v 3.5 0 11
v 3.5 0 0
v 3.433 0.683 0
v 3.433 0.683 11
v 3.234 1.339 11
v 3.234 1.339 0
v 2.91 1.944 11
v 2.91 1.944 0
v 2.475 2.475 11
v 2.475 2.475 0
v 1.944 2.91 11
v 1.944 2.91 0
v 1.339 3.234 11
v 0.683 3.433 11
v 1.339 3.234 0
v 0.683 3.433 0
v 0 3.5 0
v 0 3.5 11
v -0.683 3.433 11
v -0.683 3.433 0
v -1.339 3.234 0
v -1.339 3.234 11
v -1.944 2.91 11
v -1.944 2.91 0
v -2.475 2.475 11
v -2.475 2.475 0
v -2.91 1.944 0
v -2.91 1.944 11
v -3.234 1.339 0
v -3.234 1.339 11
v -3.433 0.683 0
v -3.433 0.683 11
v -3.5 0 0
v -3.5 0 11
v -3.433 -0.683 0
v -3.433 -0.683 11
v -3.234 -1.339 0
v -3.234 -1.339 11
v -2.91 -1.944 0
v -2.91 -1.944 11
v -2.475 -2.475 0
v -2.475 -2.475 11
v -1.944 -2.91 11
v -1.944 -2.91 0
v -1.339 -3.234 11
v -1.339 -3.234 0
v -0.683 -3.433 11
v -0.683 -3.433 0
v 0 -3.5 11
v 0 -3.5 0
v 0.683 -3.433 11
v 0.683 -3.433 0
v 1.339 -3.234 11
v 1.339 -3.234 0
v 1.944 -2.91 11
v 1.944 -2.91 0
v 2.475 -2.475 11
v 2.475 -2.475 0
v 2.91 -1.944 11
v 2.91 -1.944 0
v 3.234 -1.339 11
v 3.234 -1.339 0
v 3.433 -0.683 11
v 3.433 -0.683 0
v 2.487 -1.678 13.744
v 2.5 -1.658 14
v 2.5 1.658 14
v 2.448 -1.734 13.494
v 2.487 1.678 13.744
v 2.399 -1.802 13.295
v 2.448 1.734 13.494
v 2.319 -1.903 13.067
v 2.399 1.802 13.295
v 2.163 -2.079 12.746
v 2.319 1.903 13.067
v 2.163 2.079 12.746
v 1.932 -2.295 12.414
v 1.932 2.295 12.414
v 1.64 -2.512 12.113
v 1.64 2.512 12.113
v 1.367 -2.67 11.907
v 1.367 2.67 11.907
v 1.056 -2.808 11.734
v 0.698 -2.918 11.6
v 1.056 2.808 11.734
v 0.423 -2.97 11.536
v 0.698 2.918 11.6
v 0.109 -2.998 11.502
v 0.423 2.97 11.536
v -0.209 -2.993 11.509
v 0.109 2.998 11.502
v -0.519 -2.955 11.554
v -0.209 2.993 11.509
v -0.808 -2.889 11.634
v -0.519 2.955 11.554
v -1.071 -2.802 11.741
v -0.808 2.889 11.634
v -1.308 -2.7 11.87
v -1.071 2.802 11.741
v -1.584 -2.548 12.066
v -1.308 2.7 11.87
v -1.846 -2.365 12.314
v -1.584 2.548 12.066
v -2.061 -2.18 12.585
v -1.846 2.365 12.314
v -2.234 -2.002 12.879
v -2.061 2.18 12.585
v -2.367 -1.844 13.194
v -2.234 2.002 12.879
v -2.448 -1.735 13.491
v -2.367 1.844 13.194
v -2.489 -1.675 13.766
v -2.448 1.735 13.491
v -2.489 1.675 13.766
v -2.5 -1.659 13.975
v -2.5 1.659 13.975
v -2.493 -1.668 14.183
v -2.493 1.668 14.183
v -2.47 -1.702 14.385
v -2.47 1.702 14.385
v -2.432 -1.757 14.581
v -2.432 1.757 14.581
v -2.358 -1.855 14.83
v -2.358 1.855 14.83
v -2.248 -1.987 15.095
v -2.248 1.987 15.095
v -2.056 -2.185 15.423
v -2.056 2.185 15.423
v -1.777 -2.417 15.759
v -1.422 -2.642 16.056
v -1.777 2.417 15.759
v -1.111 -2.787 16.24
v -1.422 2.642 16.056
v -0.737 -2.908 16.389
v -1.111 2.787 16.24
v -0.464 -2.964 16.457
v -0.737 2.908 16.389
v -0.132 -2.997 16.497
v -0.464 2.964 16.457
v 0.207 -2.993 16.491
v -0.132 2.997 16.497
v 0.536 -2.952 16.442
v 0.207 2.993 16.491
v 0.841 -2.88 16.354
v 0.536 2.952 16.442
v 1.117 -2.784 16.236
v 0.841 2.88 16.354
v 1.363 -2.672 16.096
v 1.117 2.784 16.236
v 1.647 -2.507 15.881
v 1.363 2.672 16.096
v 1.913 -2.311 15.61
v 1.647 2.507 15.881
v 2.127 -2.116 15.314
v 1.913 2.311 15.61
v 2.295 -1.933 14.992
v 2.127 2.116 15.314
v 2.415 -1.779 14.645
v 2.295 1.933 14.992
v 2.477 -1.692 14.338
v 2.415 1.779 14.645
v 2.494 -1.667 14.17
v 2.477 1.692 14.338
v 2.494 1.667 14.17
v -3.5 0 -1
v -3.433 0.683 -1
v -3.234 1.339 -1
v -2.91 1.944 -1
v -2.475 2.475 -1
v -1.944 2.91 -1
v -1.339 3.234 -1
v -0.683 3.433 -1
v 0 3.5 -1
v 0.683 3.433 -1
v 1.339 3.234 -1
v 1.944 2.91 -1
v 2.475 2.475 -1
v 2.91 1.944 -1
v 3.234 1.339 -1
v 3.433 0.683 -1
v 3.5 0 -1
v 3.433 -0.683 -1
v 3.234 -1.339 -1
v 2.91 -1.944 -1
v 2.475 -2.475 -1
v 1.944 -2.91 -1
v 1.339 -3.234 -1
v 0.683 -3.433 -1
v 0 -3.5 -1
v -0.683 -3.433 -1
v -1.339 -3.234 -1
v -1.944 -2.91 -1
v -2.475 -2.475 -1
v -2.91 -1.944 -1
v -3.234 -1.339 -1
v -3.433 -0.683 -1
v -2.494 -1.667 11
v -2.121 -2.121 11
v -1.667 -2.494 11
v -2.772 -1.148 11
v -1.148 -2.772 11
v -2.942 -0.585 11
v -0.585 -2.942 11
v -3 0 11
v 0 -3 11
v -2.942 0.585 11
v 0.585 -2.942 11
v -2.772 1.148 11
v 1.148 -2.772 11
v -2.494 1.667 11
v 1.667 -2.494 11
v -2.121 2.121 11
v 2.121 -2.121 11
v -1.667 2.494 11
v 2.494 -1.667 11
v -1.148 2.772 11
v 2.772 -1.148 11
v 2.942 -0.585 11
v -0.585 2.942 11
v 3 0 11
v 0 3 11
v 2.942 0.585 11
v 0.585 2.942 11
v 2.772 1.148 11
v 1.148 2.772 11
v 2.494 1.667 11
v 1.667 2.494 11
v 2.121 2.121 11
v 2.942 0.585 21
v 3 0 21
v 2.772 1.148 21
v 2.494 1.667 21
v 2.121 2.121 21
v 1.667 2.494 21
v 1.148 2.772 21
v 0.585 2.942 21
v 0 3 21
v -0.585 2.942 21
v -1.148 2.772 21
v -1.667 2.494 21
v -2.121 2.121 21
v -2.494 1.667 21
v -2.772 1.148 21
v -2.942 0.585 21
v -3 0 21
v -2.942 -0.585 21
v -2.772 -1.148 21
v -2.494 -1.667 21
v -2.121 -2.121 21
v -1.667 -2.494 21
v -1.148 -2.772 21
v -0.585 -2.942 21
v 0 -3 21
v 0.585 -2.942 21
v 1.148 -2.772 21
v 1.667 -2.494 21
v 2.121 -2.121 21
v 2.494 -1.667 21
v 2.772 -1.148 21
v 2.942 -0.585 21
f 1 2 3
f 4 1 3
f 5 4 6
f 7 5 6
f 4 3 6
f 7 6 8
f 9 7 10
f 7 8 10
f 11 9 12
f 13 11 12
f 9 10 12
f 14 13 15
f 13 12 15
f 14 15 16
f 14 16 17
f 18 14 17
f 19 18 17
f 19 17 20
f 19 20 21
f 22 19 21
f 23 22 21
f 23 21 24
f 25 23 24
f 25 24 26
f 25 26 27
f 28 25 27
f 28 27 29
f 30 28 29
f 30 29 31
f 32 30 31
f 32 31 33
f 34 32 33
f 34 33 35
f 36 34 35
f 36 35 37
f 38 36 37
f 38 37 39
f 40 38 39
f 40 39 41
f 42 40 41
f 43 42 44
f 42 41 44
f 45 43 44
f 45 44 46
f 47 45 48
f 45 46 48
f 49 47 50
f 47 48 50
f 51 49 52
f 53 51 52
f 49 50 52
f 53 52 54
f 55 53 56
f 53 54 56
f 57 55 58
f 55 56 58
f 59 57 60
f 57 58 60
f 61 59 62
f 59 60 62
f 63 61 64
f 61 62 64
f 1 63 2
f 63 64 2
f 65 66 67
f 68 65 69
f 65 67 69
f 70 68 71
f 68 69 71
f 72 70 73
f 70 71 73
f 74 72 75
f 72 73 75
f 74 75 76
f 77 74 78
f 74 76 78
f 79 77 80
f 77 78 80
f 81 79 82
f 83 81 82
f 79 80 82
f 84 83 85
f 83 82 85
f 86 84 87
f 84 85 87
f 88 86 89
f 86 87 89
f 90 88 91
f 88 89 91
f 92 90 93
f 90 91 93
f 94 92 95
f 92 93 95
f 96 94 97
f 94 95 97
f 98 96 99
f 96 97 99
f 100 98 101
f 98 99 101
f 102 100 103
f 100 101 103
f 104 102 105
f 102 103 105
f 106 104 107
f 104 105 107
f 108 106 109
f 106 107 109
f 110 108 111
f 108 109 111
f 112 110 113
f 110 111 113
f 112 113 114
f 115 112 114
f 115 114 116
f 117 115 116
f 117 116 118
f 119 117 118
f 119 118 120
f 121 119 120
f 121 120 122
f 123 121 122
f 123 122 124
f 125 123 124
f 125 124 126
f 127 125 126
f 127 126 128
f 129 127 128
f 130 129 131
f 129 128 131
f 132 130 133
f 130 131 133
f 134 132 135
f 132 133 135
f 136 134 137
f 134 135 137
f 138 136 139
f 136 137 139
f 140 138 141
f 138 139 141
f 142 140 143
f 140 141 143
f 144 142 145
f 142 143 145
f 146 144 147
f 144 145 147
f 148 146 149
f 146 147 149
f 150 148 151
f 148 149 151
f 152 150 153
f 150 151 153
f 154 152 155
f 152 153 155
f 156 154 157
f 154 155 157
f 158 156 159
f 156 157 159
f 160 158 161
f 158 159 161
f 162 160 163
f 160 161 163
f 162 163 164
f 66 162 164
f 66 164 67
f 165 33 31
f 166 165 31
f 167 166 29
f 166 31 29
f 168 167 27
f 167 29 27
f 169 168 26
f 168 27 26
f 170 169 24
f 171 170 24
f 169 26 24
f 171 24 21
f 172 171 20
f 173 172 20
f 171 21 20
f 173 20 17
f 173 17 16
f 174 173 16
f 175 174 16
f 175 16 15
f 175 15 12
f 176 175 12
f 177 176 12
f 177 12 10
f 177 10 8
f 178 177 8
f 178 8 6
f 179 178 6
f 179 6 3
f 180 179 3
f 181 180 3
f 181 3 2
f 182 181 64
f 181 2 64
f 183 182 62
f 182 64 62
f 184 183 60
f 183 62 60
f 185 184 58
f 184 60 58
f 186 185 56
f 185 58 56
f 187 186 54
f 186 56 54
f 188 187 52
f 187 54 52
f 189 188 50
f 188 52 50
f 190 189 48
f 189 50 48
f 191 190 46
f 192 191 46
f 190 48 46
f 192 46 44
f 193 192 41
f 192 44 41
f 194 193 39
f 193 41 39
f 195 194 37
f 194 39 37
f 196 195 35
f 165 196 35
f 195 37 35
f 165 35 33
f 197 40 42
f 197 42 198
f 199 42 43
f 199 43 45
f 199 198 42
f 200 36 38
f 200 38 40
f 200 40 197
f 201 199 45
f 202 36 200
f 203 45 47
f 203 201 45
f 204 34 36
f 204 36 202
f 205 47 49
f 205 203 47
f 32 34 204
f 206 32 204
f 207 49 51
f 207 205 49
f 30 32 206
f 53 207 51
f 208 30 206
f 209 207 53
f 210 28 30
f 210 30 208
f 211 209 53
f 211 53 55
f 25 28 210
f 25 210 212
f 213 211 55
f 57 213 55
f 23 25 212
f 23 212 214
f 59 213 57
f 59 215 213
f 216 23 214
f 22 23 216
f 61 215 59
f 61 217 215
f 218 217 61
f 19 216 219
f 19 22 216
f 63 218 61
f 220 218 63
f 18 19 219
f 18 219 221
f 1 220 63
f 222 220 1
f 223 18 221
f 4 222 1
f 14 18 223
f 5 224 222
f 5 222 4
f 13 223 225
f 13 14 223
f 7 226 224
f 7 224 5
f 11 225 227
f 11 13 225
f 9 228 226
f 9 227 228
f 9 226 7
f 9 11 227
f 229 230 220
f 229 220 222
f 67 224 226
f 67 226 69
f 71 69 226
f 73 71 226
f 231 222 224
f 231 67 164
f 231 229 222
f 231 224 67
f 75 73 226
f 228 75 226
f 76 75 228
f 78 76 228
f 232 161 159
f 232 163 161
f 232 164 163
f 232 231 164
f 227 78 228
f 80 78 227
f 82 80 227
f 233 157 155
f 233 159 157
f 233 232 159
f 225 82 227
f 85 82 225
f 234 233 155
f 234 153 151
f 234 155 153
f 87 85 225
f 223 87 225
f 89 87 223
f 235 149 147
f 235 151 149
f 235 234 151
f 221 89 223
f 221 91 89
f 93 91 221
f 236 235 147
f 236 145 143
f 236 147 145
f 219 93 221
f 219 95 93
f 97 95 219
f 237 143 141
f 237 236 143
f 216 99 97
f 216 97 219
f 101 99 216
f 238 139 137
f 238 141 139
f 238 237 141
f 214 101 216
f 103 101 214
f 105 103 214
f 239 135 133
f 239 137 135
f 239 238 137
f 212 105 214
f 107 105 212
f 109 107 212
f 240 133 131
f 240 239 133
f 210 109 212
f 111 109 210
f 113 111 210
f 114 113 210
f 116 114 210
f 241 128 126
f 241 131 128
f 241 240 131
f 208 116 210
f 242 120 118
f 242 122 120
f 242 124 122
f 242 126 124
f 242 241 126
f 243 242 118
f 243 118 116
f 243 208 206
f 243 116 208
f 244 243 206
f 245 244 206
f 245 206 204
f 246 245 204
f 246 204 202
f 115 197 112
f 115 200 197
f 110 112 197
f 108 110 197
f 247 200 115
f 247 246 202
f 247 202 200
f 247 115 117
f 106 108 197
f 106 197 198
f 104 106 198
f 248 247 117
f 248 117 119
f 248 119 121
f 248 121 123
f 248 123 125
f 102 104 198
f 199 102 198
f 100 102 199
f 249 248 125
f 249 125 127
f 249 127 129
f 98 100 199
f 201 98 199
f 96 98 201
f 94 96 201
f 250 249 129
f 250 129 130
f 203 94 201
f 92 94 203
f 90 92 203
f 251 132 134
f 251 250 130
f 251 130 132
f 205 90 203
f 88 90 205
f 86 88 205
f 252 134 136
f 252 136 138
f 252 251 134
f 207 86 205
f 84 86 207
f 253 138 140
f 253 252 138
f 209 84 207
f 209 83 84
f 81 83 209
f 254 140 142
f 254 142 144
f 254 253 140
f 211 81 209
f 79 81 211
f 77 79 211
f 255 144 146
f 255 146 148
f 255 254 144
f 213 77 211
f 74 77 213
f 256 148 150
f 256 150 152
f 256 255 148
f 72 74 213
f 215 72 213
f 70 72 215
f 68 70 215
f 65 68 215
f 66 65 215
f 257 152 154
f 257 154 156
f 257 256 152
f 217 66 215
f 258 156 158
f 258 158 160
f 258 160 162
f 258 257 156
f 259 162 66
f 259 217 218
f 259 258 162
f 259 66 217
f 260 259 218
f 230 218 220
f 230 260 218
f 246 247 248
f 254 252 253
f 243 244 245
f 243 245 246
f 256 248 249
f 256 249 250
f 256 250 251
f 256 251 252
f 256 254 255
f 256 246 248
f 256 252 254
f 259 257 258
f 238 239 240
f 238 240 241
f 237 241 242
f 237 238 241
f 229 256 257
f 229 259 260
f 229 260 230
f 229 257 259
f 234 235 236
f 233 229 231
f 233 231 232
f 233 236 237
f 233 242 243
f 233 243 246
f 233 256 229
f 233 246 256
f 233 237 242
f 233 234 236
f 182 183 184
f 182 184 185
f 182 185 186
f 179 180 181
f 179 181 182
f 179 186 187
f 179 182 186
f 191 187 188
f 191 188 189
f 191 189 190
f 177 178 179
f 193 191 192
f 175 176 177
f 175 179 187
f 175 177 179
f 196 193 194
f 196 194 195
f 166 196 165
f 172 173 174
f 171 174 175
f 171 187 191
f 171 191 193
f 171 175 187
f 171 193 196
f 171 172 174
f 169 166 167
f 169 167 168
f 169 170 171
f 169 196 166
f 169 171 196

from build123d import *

# Parameters (mm, degrees)
CROQUIS1_R              = 3.5
SALIENTE_EXTRUIR1_DEPTH = 21
CROQUIS2_R              = 3.5
CROQUIS2_R_2            = 3
CORTAR_EXTRUIR1_DEPTH   = 10
CROQUIS3_R              = 2.5
CORTAR_EXTRUIR2_DEPTH   = 10
CROQUIS4_R              = 3.5
SALIENTE_EXTRUIR2_DEPTH = 1


with BuildPart() as part:
    # Croquis1 → Saliente-Extruir1 (new body)
    with BuildSketch(Plane.XY):
        Circle(CROQUIS1_R)
    extrude(amount=SALIENTE_EXTRUIR1_DEPTH)

    # Croquis2 → Cortar-Extruir1 (cut)
    with BuildSketch(Plane.XY.offset(21)):
        Circle(CROQUIS2_R)
        Circle(CROQUIS2_R_2, mode=Mode.SUBTRACT)
    extrude(amount=-CORTAR_EXTRUIR1_DEPTH, mode=Mode.SUBTRACT)

    # Croquis3 → Cortar-Extruir2 (cut)
    with BuildSketch(Plane(origin=(0, 0, 0), x_dir=(1, 0, 0), z_dir=(0, 1, 0))):
        with Locations((0, -14)):
            Circle(CROQUIS3_R)
    cortar_extruir2 = extrude(amount=-CORTAR_EXTRUIR2_DEPTH, mode=Mode.SUBTRACT)

    # Simetría1: Cortar-Extruir2 across plane
    add(cortar_extruir2.mirror(Plane.ZX), mode=Mode.SUBTRACT)

    # Croquis4 → Saliente-Extruir2 (add)
    with BuildSketch(Plane(origin=(0, 0, 0), x_dir=(-1, 0, 0), z_dir=(0, 0, -1))):
        Circle(CROQUIS4_R)
    extrude(amount=SALIENTE_EXTRUIR2_DEPTH)


solid = part.part
